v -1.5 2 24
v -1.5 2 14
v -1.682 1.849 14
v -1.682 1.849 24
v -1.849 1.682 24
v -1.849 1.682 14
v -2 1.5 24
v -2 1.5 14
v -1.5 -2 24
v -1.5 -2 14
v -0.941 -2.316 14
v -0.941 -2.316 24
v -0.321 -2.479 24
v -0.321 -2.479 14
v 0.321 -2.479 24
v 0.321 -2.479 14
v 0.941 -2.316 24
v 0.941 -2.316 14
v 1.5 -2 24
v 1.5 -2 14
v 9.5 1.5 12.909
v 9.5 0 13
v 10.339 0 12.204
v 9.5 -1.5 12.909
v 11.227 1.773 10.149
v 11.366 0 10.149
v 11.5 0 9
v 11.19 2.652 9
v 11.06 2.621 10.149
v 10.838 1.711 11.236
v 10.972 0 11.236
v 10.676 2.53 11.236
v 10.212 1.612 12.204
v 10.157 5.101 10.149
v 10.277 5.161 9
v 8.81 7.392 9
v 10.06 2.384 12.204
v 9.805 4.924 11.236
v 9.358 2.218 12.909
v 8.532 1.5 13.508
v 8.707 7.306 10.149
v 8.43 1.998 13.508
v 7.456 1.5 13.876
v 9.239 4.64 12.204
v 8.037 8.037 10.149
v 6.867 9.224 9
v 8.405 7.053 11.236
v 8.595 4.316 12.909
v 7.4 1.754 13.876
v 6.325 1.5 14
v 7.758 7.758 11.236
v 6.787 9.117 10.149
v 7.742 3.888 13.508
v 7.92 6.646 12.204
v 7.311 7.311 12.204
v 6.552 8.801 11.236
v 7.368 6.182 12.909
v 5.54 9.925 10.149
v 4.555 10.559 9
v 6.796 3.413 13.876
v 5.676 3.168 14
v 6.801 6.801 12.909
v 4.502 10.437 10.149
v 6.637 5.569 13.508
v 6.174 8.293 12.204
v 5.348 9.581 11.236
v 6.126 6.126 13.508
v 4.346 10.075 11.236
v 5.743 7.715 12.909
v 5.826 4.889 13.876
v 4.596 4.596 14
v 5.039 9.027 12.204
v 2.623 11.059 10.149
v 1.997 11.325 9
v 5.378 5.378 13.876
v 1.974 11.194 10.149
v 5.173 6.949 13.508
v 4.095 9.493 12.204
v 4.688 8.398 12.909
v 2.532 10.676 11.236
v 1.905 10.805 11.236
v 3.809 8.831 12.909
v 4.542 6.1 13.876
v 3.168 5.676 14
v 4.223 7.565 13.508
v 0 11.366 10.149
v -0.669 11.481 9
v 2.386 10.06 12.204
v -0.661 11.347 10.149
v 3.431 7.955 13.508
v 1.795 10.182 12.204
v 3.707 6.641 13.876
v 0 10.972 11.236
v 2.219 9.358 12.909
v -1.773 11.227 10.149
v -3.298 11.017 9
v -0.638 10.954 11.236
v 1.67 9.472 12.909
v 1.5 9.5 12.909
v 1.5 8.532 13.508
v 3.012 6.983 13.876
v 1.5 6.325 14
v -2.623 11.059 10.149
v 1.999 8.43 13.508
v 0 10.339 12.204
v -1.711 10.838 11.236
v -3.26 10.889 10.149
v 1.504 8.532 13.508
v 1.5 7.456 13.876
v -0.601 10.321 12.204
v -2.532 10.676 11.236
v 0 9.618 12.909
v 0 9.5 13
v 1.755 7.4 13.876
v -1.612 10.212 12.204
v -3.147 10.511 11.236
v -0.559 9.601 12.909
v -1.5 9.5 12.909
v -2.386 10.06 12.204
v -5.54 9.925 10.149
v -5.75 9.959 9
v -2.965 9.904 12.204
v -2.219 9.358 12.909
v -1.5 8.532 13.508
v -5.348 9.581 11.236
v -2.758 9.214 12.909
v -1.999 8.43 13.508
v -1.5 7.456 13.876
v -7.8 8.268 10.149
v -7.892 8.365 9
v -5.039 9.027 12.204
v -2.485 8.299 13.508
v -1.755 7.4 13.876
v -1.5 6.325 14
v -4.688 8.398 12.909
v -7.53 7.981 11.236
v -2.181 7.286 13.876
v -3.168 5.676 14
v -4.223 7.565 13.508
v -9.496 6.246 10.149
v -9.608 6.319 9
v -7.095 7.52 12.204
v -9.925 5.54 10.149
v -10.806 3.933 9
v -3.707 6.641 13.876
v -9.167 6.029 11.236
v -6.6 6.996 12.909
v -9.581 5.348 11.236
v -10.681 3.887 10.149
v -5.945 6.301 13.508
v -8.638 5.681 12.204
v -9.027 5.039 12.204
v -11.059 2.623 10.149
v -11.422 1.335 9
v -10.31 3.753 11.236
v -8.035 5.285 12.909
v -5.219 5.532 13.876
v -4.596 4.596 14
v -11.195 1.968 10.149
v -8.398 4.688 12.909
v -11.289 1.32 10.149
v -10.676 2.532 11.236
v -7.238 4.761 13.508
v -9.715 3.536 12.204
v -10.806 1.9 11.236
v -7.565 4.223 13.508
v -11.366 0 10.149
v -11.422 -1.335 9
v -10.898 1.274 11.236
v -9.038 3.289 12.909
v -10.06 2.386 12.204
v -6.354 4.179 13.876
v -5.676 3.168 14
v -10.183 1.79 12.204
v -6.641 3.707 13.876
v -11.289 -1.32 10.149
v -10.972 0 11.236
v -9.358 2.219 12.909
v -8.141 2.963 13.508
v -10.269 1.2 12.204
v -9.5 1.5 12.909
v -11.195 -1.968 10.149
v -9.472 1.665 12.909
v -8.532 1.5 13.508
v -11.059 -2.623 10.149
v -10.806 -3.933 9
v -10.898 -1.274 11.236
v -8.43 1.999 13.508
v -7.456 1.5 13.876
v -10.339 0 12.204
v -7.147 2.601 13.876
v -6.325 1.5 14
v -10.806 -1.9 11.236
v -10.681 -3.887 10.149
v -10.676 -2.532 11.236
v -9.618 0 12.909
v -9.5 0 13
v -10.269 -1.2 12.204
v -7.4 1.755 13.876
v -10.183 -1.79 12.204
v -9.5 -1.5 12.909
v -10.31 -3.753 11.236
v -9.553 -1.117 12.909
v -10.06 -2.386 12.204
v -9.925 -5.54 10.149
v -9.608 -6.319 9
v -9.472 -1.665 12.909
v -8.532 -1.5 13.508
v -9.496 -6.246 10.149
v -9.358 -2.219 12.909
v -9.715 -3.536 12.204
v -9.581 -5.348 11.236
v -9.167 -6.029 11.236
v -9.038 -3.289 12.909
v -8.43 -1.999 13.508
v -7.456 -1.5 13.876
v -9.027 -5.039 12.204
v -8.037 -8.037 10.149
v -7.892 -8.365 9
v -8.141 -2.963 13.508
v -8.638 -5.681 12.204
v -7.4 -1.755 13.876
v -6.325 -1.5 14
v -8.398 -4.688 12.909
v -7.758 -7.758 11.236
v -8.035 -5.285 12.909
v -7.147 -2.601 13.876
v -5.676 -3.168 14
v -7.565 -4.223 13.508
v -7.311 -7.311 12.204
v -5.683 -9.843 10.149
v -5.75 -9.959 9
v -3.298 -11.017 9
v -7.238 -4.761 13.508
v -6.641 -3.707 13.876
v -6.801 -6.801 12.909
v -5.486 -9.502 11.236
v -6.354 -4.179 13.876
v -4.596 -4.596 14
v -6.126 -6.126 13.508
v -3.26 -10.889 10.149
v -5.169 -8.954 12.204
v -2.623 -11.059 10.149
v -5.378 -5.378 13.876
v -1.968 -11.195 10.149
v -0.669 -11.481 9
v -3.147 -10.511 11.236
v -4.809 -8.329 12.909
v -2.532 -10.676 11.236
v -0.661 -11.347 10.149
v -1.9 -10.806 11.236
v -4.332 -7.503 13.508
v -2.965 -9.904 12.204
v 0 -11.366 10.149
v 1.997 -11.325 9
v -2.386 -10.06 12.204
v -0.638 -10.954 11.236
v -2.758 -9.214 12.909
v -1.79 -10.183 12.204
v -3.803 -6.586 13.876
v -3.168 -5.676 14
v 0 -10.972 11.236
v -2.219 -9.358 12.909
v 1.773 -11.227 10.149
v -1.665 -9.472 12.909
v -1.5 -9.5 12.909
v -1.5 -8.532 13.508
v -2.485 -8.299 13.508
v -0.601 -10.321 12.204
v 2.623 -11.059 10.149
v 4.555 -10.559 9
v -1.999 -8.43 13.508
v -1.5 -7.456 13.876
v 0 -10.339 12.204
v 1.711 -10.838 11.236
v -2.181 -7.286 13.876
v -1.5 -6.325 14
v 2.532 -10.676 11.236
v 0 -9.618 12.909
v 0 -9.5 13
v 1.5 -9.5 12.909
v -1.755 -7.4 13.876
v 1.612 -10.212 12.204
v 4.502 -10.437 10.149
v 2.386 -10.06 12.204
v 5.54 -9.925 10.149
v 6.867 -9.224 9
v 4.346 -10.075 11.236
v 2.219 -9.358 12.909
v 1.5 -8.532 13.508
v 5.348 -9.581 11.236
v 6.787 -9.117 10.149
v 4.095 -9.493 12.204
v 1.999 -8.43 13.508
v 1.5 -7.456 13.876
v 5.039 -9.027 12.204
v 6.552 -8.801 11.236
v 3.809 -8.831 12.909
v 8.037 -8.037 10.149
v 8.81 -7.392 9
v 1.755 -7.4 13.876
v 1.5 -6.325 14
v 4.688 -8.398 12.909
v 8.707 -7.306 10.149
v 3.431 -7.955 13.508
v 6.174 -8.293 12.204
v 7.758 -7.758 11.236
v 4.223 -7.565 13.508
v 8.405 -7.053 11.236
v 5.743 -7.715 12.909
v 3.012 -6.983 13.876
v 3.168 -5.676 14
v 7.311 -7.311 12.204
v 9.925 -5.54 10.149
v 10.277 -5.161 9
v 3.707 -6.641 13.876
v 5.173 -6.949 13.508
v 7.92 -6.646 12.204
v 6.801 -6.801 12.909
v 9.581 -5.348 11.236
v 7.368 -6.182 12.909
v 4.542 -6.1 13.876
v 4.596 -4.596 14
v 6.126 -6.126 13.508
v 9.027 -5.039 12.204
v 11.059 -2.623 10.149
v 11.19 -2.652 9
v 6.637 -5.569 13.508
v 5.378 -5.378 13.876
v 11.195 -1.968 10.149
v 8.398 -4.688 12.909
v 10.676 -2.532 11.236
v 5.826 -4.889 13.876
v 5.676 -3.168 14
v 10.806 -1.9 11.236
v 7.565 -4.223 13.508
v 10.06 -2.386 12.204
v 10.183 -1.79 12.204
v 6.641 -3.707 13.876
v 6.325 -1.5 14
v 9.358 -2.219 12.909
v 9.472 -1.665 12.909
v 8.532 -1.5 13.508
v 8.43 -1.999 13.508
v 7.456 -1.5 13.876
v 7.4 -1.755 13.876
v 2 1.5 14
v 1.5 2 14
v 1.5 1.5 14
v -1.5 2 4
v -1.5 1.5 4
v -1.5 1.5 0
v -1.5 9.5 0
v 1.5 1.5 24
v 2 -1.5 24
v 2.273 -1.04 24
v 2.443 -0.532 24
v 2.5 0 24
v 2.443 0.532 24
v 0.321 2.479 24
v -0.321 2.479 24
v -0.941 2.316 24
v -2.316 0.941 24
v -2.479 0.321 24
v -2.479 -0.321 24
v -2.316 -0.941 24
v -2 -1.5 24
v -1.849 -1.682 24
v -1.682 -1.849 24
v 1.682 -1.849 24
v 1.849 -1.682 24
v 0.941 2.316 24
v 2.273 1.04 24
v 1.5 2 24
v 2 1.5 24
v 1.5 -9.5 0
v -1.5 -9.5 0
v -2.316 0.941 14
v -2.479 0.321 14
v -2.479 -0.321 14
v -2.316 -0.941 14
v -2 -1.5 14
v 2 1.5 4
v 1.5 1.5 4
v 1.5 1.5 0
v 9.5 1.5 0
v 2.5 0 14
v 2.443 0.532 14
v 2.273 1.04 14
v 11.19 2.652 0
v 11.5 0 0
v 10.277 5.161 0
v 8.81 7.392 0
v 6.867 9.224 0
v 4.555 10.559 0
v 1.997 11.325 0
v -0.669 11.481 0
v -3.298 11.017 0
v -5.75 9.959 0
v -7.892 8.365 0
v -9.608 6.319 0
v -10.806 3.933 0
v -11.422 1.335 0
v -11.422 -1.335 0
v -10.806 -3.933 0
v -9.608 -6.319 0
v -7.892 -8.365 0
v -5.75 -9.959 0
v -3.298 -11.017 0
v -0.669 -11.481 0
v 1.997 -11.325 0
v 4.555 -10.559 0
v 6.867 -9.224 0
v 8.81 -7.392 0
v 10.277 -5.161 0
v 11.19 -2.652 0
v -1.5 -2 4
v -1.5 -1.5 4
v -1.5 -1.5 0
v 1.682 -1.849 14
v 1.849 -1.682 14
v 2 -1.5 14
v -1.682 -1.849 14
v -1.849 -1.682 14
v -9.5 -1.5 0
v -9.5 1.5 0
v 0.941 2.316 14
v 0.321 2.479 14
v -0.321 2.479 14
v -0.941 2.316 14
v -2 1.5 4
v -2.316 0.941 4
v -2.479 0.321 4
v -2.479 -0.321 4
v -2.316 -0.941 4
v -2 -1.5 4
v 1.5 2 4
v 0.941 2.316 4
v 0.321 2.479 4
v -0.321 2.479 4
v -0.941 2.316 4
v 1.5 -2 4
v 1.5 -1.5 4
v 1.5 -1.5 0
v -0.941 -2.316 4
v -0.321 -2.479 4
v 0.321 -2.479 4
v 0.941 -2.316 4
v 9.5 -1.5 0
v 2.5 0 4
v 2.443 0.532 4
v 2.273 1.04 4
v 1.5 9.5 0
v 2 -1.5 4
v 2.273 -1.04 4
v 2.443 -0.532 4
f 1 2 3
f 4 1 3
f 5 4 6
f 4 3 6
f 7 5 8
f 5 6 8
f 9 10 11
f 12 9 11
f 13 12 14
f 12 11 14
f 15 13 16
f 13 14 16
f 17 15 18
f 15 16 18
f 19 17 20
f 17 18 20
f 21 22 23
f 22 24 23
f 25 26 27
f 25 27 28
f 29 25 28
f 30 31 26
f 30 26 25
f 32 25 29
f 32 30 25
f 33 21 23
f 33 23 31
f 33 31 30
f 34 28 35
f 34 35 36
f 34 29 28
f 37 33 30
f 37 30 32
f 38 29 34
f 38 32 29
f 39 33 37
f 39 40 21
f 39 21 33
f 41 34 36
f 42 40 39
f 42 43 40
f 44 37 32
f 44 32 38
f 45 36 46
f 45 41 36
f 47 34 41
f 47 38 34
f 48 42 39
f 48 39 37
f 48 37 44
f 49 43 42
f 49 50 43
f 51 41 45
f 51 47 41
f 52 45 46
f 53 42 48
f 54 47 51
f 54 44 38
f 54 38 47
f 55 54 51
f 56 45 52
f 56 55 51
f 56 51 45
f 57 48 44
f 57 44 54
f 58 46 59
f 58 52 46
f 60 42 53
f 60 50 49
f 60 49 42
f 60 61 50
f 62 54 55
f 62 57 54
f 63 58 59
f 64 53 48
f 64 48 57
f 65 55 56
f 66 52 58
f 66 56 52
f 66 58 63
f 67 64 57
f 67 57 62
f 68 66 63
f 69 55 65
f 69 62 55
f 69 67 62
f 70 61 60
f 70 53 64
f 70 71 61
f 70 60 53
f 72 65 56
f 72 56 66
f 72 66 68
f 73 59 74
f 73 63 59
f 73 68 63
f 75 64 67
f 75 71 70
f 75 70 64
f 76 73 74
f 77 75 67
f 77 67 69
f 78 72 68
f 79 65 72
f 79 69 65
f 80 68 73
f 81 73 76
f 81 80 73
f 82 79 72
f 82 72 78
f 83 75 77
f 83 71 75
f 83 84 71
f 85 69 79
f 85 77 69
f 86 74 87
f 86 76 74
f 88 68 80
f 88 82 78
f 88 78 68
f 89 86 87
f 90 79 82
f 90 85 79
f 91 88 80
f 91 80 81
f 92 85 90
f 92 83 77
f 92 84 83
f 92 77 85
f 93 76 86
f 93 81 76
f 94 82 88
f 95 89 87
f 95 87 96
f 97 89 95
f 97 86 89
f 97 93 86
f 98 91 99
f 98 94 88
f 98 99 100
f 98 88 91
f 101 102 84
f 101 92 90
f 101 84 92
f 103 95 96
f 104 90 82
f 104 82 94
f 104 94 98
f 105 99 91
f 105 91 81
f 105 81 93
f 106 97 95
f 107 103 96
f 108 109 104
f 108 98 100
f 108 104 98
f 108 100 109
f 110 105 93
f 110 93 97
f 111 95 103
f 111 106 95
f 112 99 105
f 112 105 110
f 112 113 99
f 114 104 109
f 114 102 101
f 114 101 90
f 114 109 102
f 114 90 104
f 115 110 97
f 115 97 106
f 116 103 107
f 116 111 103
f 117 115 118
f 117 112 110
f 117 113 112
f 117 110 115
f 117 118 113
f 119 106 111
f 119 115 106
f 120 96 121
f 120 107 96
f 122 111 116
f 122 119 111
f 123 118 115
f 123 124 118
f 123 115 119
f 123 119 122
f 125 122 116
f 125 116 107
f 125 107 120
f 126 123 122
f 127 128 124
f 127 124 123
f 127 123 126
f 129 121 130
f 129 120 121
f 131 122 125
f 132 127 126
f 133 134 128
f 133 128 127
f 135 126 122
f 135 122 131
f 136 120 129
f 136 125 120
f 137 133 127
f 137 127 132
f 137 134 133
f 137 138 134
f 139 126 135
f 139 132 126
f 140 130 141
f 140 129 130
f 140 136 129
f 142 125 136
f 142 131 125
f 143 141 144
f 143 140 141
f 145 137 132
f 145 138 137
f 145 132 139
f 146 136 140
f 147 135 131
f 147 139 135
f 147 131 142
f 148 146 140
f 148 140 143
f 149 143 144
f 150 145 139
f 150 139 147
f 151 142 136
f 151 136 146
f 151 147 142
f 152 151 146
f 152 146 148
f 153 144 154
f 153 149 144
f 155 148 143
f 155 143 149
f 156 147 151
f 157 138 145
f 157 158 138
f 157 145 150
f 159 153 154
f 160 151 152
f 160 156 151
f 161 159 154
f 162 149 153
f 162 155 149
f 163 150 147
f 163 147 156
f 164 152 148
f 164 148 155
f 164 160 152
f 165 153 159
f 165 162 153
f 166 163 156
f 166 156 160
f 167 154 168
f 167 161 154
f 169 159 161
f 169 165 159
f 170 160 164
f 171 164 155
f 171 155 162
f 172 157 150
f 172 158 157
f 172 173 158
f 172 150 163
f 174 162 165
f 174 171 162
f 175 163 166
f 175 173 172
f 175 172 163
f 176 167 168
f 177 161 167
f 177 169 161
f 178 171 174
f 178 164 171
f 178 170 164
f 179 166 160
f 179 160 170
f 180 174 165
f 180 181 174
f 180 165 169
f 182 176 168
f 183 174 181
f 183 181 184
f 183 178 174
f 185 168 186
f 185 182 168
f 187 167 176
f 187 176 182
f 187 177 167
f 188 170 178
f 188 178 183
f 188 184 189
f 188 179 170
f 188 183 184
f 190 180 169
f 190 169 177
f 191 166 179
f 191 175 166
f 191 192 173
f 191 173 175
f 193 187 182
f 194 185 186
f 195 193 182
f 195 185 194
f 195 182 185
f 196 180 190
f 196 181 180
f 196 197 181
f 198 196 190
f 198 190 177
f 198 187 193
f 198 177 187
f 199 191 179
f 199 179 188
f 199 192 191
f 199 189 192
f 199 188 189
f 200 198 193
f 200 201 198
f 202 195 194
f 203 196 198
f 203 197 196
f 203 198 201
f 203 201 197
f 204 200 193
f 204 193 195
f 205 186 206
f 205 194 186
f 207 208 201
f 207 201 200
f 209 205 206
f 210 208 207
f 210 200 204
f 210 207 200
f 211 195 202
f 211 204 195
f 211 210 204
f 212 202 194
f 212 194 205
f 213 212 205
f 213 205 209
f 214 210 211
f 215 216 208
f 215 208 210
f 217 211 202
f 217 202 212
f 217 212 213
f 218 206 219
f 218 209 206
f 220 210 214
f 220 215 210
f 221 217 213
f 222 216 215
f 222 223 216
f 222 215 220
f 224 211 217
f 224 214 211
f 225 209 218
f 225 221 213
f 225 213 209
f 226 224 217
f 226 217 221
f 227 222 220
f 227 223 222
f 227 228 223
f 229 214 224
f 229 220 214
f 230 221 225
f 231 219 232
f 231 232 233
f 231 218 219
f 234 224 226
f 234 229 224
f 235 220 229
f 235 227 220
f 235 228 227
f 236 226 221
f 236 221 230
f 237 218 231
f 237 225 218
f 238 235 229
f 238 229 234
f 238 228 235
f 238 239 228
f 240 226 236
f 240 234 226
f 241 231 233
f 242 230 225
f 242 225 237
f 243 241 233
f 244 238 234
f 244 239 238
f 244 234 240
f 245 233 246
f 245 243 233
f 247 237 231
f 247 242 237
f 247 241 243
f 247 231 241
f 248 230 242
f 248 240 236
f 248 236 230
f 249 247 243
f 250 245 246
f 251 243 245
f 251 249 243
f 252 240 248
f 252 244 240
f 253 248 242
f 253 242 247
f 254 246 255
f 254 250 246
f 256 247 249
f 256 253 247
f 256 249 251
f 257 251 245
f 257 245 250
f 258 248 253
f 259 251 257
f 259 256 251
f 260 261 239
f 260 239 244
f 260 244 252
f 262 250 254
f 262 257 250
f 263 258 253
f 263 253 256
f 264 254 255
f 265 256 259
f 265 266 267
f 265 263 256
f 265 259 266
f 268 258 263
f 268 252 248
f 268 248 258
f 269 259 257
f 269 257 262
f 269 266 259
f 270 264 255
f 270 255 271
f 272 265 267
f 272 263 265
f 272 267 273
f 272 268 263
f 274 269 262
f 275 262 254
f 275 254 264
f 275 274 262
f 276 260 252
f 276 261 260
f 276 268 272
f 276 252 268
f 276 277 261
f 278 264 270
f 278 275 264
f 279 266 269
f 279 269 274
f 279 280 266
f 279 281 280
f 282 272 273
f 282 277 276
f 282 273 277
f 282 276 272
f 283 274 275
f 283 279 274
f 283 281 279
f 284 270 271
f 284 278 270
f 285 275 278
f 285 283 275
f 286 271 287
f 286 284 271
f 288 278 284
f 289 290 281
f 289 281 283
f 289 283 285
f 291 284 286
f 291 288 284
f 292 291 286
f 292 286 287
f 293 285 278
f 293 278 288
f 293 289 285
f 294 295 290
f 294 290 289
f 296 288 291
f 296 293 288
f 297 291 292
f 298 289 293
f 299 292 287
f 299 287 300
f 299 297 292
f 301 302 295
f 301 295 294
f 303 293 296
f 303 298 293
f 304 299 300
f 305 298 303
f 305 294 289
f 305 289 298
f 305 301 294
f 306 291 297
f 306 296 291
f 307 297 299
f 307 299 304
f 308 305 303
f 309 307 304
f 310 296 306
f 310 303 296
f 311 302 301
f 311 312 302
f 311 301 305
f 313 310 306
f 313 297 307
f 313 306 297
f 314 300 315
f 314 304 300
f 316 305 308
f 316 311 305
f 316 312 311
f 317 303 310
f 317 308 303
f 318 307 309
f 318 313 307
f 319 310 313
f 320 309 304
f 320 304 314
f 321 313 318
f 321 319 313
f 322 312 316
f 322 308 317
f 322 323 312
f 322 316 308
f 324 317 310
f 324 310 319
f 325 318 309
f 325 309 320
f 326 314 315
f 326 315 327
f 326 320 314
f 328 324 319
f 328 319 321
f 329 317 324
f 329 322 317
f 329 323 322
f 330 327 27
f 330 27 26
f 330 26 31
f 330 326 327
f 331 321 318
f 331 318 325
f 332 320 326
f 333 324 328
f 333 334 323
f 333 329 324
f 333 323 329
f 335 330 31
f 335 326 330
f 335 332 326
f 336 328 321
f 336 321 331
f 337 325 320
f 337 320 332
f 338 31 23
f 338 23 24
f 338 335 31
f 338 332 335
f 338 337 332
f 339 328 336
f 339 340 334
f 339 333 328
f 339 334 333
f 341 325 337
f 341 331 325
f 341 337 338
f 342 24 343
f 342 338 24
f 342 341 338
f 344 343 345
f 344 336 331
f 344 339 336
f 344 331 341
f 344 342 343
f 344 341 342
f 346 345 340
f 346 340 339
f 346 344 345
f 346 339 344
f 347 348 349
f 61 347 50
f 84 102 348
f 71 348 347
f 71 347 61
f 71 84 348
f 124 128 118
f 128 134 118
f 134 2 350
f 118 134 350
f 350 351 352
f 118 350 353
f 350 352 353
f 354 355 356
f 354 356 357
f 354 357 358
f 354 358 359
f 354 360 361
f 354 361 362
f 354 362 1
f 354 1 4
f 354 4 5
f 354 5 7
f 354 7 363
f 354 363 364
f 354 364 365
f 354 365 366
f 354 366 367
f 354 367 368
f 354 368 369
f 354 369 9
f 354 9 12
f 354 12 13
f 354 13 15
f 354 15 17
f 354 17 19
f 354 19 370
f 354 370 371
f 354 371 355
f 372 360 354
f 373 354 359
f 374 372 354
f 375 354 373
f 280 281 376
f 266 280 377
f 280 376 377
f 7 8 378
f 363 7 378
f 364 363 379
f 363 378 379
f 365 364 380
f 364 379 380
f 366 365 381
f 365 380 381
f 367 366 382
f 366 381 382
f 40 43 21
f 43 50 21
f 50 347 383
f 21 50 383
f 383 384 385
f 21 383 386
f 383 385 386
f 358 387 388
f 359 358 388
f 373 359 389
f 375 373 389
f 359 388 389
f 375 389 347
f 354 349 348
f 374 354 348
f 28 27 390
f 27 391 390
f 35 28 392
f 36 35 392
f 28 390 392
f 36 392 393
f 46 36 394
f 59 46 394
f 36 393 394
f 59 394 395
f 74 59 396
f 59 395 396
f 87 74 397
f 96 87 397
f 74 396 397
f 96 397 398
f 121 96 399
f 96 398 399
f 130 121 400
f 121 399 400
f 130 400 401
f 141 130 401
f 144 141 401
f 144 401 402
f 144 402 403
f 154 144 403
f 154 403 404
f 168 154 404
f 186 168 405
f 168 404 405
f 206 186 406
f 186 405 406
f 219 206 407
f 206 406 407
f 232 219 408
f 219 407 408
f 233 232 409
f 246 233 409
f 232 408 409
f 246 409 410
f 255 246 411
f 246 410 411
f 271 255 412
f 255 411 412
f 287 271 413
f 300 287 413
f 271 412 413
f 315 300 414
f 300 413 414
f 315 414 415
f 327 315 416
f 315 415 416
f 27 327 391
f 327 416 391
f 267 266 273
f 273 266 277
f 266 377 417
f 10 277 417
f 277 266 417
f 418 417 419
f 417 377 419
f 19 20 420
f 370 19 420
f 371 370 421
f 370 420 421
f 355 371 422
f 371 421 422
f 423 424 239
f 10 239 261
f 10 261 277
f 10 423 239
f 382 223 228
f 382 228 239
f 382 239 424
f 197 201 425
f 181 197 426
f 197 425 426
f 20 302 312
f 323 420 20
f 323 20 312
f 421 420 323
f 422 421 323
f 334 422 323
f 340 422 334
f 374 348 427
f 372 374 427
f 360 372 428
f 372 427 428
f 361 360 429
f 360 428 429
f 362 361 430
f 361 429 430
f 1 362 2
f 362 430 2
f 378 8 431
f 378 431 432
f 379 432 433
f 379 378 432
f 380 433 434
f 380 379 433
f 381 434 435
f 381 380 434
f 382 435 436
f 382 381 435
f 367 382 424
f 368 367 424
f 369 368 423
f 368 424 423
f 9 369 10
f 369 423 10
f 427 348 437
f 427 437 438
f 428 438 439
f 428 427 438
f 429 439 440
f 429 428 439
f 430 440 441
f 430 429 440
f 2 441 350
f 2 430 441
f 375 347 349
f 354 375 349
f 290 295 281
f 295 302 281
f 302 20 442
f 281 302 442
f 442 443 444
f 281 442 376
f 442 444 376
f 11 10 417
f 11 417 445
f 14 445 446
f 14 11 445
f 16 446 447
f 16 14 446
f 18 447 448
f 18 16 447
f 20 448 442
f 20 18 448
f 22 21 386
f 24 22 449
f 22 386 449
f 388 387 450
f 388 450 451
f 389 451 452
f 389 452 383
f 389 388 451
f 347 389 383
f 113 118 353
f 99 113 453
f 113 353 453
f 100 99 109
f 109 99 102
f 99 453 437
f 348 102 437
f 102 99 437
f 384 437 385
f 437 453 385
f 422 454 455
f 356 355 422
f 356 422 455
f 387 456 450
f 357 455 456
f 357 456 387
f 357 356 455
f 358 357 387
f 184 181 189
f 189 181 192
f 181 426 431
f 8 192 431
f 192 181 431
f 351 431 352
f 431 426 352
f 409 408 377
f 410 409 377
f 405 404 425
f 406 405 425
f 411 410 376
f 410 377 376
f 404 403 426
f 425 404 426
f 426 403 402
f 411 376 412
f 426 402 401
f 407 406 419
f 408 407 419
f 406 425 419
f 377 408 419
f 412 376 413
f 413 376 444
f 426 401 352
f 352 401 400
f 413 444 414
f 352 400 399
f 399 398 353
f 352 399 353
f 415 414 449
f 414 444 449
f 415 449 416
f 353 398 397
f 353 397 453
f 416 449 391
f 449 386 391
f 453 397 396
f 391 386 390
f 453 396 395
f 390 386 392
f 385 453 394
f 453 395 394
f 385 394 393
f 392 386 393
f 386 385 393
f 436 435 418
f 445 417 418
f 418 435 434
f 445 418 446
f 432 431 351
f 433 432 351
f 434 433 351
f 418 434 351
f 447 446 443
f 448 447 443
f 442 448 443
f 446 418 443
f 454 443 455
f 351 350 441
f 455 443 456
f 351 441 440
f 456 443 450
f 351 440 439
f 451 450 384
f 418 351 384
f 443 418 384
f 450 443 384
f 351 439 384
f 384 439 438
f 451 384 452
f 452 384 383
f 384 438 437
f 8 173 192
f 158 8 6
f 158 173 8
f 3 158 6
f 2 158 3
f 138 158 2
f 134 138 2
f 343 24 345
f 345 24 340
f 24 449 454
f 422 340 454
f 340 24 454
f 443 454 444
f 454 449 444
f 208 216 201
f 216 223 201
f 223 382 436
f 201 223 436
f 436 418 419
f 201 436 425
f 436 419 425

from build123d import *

# Parameters (mm, degrees)
F0_R     = 11.5
F1_DEPTH = 11
F2_R     = 11.5
F3_DEPTH = 3
F6_DEPTH = 10


# Not quite as in the source:
# - a fillet or chamfer that OpenCascade refuses, or shapes differently, is made with other operations: its cross-section is extruded or revolved along the edge and cut away or added


with BuildPart() as f1:
    # F0 (on Top) → F1 (new body)
    with BuildSketch(Plane.XY):
        Circle(F0_R)
        Polygon((9.5, 1.5), (9.5, -1.5), (1.5, -1.5), (1.5, -9.5), (-1.5, -9.5), (-1.5, -1.5), (-9.5, -1.5), (-9.5, 1.5), (-1.5, 1.5), (-1.5, 9.5), (1.5, 9.5), (1.5, 1.5), align=None, mode=Mode.SUBTRACT)
    extrude(amount=F1_DEPTH)

    # F2 (on face) → F3 (join)
    with BuildSketch(Plane.XY.offset(11)):
        Circle(F2_R)
        Polygon((1.5, 1.5), (9.5, 1.5), (9.5, -1.5), (1.5, -1.5), (1.5, -9.5), (-1.5, -9.5), (-1.5, -1.5), (-9.5, -1.5), (-9.5, 1.5), (-1.5, 1.5), (-1.5, 9.5), (1.5, 9.5), align=None, mode=Mode.SUBTRACT)
    extrude(amount=F3_DEPTH)

    # F4: fillet of radius 5 on 1 edges, made by hand

    # F4_s1 → F4_t2 (revolve, cut)
    with BuildSketch(Plane.XZ):
        with BuildLine():
            ThreePointArc((11.5, 9), (10.0355339059, 12.5355339059), (6.5, 14))
            Line((6.5, 14), (11.5, 14))
            Line((11.5, 14), (11.5, 9))
        make_face()
    revolve(axis=Axis((0, 0, 14), (0, 0, 1)), mode=Mode.SUBTRACT)

    # F5 (on face) → F6 (join, symmetric)
    with BuildSketch(Plane.XY.offset(14)):
        with BuildLine():
            ThreePointArc((2, -1.5), (2.3717082451, -0.790569415), (2.5, 0))
            ThreePointArc((2.5, 0), (2.3717082451, 0.790569415), (2, 1.5))
            Line((2, 1.5), (1.5, 1.5))
            Line((1.5, 1.5), (1.5, 2))
            ThreePointArc((1.5, 2), (0, 2.5), (-1.5, 2))
            Line((-1.5, 2), (-1.5, 1.5))
            Line((-1.5, 1.5), (-2, 1.5))
            ThreePointArc((-2, 1.5), (-2.5, 0), (-2, -1.5))
            Line((-2, -1.5), (-1.5, -1.5))
            Line((-1.5, -1.5), (-1.5, -2))
            ThreePointArc((-1.5, -2), (0, -2.5), (1.5, -2))
            Line((1.5, -2), (1.5, -1.5))
            Line((1.5, -1.5), (2, -1.5))
        make_face()
        with BuildLine():
            ThreePointArc((1.5, -2), (1.767766953, -1.767766953), (2, -1.5))
            Line((2, -1.5), (1.5, -1.5))
            Line((1.5, -1.5), (1.5, -2))
        make_face()
        with BuildLine():
            Line((-1.5, 1.5), (-1.5, 2))
            ThreePointArc((-1.5, 2), (-1.767766953, 1.767766953), (-2, 1.5))
            Line((-2, 1.5), (-1.5, 1.5))
        make_face()
        with BuildLine():
            ThreePointArc((-2, -1.5), (-1.767766953, -1.767766953), (-1.5, -2))
            Line((-1.5, -2), (-1.5, -1.5))
            Line((-1.5, -1.5), (-2, -1.5))
        make_face()
    extrude(amount=F6_DEPTH, both=True)


solid = f1.part
